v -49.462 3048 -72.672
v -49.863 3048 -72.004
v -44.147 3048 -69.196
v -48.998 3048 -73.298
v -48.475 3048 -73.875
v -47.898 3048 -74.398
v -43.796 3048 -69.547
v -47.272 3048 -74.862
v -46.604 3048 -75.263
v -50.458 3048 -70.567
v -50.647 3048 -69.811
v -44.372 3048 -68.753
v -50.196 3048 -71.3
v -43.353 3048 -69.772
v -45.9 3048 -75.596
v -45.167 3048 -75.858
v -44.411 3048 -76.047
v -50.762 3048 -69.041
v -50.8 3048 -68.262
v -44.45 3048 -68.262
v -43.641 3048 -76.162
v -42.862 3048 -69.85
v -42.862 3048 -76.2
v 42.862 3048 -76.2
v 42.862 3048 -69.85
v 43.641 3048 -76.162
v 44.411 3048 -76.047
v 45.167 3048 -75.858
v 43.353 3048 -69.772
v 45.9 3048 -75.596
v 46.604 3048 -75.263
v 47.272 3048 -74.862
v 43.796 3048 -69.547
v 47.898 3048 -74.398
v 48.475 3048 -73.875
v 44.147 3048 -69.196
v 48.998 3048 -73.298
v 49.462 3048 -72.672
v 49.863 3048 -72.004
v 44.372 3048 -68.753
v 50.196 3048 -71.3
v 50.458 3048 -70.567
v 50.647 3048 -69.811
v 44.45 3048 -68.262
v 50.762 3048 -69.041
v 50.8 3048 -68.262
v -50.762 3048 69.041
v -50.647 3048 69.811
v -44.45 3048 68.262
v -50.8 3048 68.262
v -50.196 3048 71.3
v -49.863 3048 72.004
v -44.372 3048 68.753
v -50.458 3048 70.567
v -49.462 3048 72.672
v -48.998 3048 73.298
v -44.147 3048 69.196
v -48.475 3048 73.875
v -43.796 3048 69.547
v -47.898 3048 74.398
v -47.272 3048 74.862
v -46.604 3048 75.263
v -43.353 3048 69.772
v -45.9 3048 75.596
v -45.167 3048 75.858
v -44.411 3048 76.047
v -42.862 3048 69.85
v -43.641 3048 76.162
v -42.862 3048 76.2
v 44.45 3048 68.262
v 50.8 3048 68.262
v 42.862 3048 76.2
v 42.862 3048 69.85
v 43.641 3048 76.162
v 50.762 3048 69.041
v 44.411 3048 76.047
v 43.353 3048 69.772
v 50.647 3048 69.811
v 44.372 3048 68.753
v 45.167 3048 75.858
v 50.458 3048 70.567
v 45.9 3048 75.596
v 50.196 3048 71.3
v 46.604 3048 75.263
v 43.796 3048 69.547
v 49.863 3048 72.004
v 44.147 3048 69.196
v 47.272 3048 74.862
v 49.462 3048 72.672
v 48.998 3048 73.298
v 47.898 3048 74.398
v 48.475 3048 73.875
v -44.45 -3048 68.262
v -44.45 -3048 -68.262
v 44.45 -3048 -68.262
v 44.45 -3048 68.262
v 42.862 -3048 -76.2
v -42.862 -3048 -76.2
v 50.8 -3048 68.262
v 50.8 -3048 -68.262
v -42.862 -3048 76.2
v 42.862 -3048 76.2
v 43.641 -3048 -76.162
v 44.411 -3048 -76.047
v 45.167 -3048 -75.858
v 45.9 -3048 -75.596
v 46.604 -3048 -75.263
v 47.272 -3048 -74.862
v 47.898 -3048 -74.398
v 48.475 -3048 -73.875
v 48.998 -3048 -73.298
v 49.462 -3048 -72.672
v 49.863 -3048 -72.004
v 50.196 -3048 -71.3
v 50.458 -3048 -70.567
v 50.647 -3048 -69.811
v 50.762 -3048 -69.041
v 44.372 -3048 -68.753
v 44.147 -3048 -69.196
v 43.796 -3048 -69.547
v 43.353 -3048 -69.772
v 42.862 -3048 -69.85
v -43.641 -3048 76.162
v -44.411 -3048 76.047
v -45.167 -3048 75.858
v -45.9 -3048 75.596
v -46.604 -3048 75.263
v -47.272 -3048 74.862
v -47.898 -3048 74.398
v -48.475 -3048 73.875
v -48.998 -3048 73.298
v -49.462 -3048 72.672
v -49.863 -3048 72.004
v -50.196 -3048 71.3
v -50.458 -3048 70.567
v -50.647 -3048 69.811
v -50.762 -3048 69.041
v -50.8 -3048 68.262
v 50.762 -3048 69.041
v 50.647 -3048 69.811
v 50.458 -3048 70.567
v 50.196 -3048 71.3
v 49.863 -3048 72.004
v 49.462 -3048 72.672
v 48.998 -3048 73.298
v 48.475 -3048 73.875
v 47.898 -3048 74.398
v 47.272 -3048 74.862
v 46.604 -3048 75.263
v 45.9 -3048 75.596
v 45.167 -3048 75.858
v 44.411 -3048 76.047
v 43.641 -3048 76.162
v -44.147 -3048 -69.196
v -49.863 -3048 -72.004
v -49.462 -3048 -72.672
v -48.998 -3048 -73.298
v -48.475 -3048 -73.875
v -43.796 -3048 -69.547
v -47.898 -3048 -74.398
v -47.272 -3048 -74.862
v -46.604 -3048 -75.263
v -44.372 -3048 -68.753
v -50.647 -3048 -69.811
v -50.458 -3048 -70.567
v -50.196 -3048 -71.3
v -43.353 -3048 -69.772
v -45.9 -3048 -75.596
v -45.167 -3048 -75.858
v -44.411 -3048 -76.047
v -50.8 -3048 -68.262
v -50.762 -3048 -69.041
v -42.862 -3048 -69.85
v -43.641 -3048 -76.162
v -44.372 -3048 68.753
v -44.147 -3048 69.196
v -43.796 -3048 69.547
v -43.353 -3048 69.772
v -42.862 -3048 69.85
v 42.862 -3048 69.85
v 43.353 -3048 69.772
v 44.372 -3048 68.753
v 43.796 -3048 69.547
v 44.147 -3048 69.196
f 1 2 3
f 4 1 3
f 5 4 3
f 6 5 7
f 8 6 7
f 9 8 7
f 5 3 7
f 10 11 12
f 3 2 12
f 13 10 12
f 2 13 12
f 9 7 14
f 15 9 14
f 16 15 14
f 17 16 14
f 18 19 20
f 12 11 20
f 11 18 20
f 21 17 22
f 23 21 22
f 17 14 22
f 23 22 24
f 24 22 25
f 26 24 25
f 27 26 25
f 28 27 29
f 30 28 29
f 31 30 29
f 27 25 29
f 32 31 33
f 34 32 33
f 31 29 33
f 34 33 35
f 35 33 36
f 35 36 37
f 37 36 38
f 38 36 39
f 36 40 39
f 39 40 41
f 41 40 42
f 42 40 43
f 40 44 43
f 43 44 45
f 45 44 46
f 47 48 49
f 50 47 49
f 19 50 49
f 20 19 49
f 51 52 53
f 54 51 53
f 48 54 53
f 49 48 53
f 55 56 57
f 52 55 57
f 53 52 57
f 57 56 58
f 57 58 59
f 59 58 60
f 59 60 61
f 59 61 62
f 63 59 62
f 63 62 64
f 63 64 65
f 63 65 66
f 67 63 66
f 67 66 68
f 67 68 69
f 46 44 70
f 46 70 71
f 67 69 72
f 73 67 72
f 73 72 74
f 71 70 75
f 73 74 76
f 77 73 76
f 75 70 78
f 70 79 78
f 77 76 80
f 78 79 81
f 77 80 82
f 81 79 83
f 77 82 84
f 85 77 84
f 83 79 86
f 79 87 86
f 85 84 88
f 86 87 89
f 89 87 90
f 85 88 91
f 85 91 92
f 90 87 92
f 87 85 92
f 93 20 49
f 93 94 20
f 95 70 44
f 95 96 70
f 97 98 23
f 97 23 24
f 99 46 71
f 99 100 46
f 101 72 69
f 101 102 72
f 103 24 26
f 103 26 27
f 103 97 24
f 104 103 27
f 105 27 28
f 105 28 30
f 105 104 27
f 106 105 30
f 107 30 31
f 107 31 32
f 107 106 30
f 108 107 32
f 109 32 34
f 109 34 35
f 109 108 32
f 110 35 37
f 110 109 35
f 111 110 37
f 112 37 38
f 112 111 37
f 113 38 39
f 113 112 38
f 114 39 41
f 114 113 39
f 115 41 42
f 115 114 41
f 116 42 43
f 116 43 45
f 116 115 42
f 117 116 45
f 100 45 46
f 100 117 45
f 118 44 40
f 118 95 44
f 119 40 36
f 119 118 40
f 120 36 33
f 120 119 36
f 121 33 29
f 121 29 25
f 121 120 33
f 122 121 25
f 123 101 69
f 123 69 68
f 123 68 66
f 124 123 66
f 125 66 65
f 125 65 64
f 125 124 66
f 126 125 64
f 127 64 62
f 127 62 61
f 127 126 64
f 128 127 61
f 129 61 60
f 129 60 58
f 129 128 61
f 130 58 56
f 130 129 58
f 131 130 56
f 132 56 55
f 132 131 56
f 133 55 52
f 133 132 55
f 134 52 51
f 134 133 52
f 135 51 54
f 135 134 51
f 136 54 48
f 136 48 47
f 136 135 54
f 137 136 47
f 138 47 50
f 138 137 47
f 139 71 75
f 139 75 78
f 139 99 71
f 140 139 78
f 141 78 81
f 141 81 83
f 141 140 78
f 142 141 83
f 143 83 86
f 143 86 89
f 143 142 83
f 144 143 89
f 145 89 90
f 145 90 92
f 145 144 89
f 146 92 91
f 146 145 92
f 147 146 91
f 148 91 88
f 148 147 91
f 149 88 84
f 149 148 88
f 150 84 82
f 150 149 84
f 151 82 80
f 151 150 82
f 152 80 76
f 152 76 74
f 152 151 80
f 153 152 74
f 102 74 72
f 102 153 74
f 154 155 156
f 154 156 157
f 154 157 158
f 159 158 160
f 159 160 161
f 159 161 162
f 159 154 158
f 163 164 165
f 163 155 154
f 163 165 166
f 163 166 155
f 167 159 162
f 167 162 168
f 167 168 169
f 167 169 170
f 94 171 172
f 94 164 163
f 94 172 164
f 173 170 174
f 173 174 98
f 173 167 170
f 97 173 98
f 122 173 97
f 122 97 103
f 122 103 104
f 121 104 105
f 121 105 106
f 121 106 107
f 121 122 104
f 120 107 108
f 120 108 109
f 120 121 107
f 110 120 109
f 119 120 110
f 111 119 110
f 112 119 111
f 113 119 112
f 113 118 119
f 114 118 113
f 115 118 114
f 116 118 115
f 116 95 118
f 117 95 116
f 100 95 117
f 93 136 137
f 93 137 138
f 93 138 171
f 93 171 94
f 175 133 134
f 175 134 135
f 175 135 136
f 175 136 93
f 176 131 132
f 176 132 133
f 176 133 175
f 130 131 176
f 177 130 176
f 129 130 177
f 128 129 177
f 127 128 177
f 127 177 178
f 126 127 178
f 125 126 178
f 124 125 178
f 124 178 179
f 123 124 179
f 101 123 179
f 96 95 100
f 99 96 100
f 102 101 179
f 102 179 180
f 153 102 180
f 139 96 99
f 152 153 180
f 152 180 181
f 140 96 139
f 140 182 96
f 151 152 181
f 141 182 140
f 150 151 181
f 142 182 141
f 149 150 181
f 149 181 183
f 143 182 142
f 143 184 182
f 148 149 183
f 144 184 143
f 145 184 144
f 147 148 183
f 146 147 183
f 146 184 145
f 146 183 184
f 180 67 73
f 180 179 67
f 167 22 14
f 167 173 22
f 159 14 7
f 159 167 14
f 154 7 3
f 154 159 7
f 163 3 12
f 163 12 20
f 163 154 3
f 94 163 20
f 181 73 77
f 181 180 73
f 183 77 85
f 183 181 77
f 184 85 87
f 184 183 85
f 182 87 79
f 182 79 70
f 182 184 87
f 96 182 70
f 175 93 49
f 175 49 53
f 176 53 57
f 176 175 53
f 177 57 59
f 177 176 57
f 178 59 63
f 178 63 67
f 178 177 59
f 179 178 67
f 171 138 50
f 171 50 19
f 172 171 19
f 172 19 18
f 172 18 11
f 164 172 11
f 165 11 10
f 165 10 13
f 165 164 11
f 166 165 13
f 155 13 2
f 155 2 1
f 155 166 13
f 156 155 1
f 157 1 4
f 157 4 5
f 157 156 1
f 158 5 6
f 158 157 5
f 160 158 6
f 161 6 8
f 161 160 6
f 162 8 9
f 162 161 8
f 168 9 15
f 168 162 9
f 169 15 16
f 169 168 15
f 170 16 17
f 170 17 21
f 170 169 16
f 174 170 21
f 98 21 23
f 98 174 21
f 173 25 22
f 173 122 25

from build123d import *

# Parameters (mm, degrees)
F1_DEPTH = 3048


with BuildPart() as f1:
    # F0 (on Front) → F1 (new body, symmetric)
    with BuildSketch(Plane.XZ):
        with BuildLine():
            Line((42.8625, 76.2), (-42.8625, 76.2))
            ThreePointArc((-42.8625, 76.2), (-48.47516, 73.87516), (-50.8, 68.2625))
            Line((-50.8, 68.2625), (-50.8, -68.2625))
            ThreePointArc((-50.8, -68.2625), (-48.47516, -73.87516), (-42.8625, -76.2))
            Line((-42.8625, -76.2), (42.8625, -76.2))
            ThreePointArc((42.8625, -76.2), (48.47516, -73.87516), (50.8, -68.2625))
            Line((50.8, -68.2625), (50.8, 68.2625))
            ThreePointArc((50.8, 68.2625), (48.47516, 73.87516), (42.8625, 76.2))
        make_face()
        with BuildLine():
            ThreePointArc((-44.45, 68.2625), (-43.985032, 69.385032), (-42.8625, 69.85))
            Line((-42.8625, 69.85), (42.8625, 69.85))
            ThreePointArc((42.8625, 69.85), (43.985032, 69.385032), (44.45, 68.2625))
            Line((44.45, 68.2625), (44.45, -68.2625))
            ThreePointArc((44.45, -68.2625), (43.985032, -69.385032), (42.8625, -69.85))
            Line((42.8625, -69.85), (-42.8625, -69.85))
            ThreePointArc((-42.8625, -69.85), (-43.985032, -69.385032), (-44.45, -68.2625))
            Line((-44.45, -68.2625), (-44.45, 68.2625))
        make_face(mode=Mode.SUBTRACT)
    extrude(amount=F1_DEPTH, both=True)


solid = f1.part
